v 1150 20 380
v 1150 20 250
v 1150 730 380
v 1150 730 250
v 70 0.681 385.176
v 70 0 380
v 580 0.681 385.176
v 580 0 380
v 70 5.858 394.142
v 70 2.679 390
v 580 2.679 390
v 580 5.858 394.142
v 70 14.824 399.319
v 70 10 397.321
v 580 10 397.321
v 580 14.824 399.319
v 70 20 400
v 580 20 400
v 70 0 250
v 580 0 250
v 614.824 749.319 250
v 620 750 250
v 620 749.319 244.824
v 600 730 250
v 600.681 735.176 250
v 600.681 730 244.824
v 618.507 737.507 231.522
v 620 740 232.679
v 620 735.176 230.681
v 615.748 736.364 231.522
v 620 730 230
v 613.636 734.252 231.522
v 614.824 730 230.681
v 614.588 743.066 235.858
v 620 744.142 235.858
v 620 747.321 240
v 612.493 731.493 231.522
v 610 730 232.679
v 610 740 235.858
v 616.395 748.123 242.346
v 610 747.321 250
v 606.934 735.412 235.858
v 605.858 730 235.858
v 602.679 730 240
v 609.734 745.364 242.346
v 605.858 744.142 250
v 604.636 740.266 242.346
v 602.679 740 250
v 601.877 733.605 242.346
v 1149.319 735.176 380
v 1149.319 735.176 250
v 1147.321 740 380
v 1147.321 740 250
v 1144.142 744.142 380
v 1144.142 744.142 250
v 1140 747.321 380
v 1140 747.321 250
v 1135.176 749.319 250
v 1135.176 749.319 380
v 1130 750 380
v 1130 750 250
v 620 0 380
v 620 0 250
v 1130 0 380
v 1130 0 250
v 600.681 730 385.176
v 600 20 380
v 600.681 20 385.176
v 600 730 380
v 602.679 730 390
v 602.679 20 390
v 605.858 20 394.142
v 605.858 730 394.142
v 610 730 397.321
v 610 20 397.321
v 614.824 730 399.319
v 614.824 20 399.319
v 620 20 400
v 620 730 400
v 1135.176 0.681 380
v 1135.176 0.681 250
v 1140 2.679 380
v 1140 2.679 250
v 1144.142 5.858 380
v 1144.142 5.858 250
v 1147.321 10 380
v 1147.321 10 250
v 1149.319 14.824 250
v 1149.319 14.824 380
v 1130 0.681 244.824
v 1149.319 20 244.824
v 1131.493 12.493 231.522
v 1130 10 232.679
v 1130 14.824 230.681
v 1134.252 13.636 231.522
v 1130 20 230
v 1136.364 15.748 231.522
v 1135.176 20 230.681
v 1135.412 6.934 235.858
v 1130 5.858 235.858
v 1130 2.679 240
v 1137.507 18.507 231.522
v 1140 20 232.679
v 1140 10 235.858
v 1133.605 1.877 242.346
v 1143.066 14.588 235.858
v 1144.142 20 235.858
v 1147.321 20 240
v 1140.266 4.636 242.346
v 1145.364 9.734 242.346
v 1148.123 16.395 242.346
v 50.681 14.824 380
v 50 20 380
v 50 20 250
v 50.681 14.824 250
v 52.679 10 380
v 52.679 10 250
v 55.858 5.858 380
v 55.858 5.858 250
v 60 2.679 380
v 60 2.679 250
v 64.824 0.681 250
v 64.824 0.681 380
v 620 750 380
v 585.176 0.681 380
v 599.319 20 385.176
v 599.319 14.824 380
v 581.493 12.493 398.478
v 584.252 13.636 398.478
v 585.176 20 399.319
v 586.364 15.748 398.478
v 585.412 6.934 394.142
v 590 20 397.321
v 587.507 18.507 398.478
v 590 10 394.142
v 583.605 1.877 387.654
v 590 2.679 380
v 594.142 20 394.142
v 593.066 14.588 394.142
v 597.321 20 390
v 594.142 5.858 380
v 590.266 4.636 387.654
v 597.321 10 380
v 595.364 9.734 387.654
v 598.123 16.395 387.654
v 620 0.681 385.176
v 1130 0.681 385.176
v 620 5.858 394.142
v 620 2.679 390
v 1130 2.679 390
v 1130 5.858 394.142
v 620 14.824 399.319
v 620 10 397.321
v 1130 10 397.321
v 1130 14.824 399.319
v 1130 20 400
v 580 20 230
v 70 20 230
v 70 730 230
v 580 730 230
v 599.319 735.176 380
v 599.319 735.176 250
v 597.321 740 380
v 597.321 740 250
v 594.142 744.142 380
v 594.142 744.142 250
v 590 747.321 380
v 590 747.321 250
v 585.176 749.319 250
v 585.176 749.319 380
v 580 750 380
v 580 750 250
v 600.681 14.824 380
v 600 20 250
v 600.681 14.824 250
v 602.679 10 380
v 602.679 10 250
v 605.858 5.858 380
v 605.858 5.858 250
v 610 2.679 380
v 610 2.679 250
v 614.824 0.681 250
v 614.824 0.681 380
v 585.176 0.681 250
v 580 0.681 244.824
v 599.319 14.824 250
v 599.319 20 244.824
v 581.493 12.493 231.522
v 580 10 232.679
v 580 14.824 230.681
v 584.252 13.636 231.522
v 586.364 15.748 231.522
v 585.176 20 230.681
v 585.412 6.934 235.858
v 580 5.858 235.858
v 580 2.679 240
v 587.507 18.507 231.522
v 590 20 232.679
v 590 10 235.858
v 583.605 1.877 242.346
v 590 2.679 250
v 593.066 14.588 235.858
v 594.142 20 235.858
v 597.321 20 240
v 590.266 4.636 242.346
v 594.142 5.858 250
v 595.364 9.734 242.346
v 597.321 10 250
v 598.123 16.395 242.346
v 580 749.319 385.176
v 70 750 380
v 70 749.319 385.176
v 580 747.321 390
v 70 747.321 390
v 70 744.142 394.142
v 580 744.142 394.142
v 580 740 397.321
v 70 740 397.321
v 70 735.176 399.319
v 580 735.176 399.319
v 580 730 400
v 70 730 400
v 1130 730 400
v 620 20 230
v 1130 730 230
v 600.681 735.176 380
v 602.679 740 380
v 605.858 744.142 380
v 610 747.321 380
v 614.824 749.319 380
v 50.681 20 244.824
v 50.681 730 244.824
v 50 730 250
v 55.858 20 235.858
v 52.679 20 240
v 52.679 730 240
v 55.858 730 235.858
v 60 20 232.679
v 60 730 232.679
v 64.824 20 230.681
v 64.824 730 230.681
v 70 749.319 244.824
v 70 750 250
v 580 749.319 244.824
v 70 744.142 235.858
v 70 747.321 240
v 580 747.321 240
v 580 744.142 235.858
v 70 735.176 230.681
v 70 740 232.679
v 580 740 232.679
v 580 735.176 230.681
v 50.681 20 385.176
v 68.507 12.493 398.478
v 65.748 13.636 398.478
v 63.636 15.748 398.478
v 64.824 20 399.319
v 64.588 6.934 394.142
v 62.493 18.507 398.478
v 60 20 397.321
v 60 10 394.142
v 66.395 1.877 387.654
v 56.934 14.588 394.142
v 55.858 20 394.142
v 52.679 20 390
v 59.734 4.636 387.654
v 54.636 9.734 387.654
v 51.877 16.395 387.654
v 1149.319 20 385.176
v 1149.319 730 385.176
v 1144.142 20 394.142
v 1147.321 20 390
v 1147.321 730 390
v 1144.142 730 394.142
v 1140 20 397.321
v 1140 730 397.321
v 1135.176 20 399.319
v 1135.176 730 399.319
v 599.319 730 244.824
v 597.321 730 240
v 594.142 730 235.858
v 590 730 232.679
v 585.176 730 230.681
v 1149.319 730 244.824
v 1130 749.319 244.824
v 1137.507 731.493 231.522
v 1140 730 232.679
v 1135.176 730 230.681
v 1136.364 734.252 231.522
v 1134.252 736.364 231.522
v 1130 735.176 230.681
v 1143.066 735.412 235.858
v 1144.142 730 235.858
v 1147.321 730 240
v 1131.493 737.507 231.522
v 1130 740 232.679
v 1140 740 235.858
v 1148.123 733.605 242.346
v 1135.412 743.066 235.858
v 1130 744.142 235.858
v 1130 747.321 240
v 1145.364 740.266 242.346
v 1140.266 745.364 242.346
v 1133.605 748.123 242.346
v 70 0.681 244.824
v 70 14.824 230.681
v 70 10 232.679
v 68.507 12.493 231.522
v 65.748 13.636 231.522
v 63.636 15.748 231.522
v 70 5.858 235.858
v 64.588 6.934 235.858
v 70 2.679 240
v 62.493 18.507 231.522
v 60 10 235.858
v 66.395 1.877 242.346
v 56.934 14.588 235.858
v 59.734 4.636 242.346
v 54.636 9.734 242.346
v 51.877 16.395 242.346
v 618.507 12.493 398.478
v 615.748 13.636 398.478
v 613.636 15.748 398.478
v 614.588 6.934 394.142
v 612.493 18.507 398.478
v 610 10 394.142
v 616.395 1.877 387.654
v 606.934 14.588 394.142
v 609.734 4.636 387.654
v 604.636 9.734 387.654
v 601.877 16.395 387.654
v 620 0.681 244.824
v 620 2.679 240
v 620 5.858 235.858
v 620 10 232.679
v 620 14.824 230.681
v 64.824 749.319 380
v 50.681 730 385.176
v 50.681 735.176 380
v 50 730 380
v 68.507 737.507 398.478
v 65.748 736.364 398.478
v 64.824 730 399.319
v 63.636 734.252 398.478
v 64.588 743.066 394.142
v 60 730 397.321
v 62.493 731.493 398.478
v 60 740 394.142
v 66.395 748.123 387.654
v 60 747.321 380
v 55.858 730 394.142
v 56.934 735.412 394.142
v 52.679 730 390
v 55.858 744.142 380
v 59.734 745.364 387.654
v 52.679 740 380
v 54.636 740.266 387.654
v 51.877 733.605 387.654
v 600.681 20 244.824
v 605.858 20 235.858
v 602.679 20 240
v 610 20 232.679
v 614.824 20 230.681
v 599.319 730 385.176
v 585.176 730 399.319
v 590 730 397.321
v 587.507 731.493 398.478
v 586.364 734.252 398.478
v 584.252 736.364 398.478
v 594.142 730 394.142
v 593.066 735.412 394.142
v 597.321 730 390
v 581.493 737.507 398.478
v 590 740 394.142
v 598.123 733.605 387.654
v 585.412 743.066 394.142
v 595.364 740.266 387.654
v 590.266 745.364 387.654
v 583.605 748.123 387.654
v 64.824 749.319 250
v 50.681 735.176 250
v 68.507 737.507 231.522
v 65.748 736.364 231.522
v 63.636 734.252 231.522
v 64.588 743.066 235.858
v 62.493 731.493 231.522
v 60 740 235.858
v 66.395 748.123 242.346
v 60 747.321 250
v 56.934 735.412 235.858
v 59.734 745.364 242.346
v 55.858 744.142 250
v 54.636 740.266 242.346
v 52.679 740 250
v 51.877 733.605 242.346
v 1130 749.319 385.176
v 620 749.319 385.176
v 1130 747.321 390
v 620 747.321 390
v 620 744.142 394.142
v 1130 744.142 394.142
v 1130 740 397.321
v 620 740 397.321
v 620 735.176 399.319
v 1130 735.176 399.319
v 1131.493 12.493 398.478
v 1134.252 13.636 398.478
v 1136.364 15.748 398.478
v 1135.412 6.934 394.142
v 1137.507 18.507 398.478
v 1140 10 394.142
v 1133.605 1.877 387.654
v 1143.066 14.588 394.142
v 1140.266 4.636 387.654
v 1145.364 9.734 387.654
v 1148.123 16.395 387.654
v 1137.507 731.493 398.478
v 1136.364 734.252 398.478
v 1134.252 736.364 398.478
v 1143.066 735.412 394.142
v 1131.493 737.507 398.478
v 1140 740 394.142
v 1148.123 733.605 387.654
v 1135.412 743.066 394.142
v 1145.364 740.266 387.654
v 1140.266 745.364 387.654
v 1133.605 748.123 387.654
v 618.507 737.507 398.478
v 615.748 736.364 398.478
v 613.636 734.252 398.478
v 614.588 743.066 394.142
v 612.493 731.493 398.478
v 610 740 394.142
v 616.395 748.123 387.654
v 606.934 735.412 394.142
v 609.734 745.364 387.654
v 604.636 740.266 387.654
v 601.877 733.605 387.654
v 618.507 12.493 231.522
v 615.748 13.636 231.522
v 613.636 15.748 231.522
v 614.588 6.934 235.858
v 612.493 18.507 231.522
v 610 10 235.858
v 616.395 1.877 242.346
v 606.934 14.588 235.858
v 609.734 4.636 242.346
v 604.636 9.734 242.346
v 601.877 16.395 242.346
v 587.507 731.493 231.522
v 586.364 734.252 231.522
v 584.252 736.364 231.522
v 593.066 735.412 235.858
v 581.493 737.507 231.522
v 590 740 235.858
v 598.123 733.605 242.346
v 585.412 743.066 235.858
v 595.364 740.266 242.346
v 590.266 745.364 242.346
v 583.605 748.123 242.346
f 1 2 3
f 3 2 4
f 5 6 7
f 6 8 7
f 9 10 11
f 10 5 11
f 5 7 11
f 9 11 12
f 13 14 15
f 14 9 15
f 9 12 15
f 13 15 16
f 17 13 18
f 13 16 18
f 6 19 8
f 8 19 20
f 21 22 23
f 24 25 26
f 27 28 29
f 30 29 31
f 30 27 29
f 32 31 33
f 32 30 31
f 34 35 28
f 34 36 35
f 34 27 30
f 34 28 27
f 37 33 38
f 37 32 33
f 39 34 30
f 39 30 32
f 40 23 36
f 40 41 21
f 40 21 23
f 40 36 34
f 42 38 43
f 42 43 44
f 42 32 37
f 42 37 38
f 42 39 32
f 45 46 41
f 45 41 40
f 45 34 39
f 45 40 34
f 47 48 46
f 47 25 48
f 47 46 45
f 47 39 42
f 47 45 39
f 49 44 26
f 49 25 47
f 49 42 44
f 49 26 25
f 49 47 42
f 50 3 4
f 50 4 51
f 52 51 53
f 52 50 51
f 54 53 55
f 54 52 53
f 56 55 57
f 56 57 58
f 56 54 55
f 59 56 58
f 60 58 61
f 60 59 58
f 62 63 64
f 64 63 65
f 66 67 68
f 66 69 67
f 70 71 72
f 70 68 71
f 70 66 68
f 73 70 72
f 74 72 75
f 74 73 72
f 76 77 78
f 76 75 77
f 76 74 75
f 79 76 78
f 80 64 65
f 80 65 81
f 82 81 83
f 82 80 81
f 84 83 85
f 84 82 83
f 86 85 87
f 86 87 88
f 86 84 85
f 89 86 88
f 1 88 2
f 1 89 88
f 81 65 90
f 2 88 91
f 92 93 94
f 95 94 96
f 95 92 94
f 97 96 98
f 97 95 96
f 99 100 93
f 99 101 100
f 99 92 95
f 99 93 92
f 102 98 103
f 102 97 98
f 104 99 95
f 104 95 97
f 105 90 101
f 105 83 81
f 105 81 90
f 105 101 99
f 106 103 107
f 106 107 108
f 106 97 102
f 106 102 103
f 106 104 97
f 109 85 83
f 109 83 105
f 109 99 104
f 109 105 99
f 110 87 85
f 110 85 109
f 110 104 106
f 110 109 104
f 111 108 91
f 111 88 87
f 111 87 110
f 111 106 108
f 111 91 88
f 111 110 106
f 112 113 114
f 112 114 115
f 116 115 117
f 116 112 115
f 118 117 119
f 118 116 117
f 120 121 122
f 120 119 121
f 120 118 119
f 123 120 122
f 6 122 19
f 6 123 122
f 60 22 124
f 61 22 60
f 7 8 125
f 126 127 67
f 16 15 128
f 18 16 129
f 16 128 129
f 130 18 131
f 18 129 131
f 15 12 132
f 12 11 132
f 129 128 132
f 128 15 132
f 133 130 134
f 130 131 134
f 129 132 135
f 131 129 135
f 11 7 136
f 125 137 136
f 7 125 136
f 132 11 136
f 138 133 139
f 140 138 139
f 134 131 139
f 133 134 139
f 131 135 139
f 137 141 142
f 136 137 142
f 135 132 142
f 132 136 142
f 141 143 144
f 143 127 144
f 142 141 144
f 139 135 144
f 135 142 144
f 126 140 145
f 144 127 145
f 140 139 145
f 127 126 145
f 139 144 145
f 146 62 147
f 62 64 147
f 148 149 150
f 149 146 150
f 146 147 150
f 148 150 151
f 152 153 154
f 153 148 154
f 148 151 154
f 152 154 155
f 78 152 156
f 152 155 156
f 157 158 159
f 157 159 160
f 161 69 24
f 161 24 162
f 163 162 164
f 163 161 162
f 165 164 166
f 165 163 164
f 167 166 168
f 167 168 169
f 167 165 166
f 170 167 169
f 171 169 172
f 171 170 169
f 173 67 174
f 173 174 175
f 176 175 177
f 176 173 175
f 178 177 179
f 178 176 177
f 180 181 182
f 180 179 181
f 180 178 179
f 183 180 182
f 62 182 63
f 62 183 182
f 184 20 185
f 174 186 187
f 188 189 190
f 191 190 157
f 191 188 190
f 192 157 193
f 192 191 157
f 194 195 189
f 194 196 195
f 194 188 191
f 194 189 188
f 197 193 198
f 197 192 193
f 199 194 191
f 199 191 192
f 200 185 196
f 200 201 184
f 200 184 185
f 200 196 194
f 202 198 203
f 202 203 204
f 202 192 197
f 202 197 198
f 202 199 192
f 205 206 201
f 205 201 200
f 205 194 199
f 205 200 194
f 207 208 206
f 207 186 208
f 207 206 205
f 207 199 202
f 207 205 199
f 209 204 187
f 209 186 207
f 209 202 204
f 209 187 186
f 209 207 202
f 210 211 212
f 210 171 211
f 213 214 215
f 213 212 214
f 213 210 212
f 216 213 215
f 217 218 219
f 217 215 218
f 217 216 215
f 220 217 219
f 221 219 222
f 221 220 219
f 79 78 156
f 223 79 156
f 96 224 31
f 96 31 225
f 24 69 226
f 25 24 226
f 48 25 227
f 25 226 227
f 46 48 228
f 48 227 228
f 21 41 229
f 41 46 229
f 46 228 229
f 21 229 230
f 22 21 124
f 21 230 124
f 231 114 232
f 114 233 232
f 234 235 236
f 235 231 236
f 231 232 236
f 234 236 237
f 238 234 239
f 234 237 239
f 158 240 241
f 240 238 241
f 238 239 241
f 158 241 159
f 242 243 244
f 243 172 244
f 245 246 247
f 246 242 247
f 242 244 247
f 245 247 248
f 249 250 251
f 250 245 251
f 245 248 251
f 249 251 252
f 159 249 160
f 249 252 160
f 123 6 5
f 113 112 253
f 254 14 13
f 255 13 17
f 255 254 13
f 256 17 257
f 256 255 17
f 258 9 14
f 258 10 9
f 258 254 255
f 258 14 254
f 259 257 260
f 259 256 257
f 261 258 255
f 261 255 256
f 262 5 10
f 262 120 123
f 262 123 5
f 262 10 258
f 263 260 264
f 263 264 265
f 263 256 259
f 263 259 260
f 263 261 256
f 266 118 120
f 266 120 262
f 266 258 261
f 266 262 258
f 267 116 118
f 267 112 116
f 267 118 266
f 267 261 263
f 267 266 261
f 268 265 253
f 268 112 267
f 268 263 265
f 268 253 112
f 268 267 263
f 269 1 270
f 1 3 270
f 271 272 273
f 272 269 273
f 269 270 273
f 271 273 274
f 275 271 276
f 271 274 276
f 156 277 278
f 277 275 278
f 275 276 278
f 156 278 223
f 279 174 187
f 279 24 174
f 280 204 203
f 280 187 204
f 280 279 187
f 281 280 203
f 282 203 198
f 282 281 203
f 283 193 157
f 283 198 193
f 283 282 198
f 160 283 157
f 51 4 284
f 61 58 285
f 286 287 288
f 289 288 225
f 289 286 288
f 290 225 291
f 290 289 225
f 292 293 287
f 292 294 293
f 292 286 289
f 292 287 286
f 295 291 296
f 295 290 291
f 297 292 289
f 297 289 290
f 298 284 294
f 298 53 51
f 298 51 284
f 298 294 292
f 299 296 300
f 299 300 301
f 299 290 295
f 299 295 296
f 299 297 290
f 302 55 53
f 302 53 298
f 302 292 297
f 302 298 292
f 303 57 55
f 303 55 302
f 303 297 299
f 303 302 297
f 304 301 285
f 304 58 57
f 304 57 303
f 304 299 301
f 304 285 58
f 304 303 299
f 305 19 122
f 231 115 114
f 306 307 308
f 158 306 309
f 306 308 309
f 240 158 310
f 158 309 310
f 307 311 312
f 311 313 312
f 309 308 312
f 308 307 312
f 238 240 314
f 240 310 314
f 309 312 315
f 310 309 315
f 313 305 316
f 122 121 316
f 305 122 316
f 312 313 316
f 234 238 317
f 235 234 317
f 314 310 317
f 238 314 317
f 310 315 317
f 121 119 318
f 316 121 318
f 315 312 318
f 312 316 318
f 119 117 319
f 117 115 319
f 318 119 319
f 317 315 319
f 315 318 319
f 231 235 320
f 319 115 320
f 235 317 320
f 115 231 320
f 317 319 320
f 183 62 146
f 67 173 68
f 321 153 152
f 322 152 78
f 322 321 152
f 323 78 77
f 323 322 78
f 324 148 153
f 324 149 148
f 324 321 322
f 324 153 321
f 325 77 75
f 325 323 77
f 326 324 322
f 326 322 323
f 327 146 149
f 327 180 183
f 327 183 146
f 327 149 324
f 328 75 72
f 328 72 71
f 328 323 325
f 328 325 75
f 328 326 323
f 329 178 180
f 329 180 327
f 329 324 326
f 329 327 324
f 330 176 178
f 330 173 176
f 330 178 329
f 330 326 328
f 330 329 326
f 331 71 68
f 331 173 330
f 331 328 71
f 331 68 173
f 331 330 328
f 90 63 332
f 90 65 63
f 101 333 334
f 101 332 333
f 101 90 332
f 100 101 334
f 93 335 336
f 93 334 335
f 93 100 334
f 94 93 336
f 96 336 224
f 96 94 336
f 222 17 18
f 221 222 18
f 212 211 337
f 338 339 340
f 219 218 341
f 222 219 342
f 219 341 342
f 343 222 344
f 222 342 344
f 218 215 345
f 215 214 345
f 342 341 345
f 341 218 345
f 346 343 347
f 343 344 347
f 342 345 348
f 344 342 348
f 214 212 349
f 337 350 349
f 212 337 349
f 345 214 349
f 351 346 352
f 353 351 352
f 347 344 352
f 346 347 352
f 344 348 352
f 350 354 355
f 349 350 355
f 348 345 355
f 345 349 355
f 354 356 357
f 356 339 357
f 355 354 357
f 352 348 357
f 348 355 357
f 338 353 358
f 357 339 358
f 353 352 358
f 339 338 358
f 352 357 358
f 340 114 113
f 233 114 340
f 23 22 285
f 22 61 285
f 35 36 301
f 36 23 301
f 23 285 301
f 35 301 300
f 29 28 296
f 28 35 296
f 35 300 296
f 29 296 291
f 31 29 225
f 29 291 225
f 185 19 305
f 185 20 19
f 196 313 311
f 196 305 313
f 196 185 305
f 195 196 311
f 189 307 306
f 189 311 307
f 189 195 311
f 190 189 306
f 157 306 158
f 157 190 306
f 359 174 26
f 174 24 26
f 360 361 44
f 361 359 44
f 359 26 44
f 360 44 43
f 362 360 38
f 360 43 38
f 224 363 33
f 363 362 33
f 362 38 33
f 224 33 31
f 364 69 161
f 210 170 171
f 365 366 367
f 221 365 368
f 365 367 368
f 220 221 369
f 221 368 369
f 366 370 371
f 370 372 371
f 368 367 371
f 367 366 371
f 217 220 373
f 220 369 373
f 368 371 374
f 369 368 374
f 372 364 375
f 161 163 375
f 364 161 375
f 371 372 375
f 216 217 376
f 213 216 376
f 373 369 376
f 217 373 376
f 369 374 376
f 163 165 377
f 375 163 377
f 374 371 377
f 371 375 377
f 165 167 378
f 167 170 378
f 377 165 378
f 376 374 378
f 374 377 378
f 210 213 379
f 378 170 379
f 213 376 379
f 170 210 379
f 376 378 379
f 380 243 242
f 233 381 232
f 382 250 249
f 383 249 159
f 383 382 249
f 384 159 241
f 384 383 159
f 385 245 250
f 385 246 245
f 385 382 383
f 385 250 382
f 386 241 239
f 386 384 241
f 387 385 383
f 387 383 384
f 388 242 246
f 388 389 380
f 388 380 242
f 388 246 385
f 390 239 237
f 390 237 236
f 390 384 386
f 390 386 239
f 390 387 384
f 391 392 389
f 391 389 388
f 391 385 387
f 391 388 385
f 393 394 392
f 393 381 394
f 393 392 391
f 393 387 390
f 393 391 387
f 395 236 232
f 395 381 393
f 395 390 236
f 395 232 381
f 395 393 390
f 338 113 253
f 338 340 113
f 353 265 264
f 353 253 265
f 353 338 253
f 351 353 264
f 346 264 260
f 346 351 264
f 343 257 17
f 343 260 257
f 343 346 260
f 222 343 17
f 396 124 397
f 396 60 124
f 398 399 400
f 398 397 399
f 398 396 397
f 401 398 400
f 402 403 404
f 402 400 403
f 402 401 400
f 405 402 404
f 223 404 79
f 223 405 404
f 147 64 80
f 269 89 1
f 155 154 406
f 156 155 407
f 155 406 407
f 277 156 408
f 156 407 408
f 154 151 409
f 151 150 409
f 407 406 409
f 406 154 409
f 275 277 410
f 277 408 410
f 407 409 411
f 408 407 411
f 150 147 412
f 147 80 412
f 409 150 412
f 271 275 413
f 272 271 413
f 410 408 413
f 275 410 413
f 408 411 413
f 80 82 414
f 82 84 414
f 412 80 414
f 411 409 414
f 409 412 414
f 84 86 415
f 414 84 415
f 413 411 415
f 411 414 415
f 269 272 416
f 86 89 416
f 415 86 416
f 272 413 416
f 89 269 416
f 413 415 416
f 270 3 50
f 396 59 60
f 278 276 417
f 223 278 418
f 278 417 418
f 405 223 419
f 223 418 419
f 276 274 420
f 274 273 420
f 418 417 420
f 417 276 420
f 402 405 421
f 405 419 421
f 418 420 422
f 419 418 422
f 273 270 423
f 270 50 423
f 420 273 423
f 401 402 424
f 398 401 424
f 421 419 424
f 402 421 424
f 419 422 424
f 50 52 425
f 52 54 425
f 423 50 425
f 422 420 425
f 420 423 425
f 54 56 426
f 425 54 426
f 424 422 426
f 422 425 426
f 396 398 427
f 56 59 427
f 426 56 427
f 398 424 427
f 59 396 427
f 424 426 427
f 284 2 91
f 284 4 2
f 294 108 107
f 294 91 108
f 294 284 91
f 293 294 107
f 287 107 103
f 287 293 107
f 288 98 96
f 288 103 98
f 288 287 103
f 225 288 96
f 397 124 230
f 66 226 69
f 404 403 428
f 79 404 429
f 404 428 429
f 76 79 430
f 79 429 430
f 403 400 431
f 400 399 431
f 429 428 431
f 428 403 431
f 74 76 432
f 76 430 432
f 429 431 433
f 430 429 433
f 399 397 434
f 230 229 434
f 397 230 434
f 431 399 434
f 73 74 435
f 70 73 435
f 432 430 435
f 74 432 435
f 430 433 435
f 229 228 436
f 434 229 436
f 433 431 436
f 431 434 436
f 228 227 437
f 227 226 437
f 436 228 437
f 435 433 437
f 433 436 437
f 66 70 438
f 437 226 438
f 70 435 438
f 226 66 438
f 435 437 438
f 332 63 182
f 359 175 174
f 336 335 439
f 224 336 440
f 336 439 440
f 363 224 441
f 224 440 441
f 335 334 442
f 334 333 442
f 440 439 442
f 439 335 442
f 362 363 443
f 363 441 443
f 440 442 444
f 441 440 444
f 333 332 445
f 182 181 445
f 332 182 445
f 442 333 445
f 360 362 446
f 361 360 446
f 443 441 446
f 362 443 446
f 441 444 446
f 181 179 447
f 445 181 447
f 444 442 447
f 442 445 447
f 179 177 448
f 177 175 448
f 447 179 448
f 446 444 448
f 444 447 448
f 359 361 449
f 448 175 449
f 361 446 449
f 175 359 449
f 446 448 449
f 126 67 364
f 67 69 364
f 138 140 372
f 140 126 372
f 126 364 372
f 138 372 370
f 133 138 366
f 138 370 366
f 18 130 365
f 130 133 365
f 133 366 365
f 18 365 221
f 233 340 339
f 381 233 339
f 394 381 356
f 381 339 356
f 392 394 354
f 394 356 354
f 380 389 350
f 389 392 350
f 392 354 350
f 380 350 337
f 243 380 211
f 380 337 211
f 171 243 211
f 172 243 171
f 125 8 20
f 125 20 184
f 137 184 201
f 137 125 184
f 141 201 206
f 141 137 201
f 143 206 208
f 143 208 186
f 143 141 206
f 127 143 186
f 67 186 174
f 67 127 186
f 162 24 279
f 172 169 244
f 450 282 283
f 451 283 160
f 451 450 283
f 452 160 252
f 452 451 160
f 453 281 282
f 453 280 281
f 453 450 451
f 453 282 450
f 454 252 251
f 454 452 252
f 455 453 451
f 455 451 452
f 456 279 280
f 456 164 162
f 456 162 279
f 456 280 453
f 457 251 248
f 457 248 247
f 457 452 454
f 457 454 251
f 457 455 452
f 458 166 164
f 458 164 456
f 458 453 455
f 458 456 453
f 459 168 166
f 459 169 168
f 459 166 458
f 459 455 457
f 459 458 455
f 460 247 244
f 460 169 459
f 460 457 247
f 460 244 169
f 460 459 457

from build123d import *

# Parameters (mm, degrees)
SKETCH004_W      = 550
SKETCH004_H      = 750
EXTRUDE005_DEPTH = 170
FILLET_R         = 20
ARRAY002_X_COUNT = 2
ARRAY002_X_PITCH = 550


with BuildPart() as part:
    # Sketch004 → Extrude005 (new body)
    with BuildSketch(Plane.XY):
        with Locations((275, 375)):
            Rectangle(SKETCH004_W, SKETCH004_H)
    extrude(amount=EXTRUDE005_DEPTH)

    # Fillet
    fillet_edges = [part.edges().sort_by_distance(p)[0] for p in [
        (0, 0, 85),
        (550, 0, 85),
        (275, 0, 0),
        (275, 0, 170),
        (550, 750, 85),
        (550, 375, 0),
        (550, 375, 170),
        (0, 750, 85),
        (275, 750, 0),
        (275, 750, 170),
        (0, 375, 0),
        (0, 375, 170),
    ]]
    fillet(fillet_edges, radius=FILLET_R)

    # Array002 X: part ×2


with BuildPart() as part_1:
    add(part.part)
    with Locations(*[(i * ARRAY002_X_PITCH, 0, 0) for i in range(1, ARRAY002_X_COUNT)]):
        add(part.part)


with BuildPart() as part_2:
    # Array002 placement: moved
    add(part_1.part.moved(Location((50, 0, 230))))


solid = part_2.part
